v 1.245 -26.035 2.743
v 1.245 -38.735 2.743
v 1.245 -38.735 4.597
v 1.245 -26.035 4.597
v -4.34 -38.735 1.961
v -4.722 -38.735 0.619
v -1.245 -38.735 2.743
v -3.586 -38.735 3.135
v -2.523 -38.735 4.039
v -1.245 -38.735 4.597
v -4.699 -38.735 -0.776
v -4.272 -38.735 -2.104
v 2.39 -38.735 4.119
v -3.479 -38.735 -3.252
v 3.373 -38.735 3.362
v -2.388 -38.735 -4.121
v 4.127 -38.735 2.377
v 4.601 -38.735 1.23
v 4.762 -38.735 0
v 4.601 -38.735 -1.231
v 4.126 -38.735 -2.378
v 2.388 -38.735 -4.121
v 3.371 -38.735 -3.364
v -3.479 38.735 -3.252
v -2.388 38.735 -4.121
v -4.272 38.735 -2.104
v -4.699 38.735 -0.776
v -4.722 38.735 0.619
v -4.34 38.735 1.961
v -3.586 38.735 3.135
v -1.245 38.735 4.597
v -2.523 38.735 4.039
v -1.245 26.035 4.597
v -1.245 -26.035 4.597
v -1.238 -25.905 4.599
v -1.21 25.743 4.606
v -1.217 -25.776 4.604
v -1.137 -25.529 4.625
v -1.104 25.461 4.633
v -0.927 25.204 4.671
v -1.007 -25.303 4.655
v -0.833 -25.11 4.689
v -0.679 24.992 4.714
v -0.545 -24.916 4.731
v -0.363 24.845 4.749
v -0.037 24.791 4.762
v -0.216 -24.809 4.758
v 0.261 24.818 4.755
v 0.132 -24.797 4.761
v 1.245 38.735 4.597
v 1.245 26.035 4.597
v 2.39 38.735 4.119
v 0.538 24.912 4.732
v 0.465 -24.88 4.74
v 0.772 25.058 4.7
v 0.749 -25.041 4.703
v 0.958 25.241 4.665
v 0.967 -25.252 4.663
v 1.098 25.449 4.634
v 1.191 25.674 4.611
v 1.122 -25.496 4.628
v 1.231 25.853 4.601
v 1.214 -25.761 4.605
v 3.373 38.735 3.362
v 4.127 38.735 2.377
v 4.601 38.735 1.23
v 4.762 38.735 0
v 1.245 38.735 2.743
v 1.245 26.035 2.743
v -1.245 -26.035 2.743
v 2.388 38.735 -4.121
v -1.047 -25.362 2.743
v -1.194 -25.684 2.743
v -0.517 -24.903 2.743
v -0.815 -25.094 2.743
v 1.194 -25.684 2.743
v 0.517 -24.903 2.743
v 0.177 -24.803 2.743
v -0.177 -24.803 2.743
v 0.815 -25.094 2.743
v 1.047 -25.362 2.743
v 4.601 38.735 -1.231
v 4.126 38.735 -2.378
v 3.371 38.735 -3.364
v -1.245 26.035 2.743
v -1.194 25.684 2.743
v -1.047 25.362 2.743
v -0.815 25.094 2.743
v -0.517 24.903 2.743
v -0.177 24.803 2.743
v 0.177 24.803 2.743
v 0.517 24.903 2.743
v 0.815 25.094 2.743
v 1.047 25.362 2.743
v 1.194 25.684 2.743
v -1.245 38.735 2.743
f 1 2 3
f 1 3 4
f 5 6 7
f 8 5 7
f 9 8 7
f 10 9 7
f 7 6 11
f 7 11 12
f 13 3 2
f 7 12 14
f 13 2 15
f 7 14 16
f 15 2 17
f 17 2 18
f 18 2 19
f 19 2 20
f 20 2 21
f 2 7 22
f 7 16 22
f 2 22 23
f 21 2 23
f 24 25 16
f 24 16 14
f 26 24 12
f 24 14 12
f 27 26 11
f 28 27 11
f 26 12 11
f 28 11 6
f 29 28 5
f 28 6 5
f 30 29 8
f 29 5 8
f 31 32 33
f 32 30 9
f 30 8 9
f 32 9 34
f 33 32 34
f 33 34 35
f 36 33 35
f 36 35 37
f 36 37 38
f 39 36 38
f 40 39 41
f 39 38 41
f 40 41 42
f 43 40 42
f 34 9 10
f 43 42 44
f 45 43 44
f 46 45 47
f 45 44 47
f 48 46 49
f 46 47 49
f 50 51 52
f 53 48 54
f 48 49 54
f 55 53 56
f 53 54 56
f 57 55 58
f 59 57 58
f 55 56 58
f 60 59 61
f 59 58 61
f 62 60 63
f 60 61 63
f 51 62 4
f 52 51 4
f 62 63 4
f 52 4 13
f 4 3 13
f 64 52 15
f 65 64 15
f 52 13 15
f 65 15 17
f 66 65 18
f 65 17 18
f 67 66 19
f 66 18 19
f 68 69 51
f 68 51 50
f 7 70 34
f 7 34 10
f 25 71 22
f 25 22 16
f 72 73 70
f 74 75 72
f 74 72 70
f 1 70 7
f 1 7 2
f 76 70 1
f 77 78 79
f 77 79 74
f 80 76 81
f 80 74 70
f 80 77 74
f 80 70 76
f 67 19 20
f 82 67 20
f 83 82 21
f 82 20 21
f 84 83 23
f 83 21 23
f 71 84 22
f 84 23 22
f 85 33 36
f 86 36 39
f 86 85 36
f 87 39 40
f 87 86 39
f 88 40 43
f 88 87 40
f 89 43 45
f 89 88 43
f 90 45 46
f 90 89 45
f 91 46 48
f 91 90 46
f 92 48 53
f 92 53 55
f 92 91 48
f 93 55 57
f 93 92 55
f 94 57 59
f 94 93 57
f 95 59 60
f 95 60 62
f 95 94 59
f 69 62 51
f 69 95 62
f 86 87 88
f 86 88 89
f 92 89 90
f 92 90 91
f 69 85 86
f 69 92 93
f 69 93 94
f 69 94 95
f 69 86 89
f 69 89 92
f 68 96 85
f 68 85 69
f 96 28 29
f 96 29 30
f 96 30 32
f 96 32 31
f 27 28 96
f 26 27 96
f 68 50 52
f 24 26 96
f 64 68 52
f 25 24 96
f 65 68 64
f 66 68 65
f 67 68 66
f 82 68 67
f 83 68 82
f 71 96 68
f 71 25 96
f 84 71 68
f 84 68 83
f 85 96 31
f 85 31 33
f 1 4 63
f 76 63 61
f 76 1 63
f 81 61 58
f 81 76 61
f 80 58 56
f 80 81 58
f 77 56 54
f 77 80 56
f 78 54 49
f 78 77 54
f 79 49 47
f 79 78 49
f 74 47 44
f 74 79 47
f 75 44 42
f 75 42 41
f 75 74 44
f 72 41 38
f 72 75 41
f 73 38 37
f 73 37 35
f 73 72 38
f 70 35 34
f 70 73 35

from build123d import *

# Parameters (mm, degrees)
BOSS_EXTRUDE1_DEPTH      = 38.735
BOSS_EXTRUDE1_DEPTH_BACK = 38.735
CUT_EXTRUDE4_DEPTH       = 40.625695711


with BuildPart() as part:
    # Sketch1 → Boss-Extrude1 (new, two sides: drawn at the far end of the back side and taken through both)
    with BuildSketch(Plane(origin=(0, 0, 0), x_dir=(1, 0, 0), z_dir=(0, 1, 0)).offset(-BOSS_EXTRUDE1_DEPTH_BACK)):
        with BuildLine():
            Line((2.3876, 4.120773288), (-2.3876, 4.120773288))
            ThreePointArc((-2.3876, 4.120773288), (-2.378072881, -4.126278665), (4.7625, 0))
            ThreePointArc((4.7625, 0), (4.126278665, 2.378072881), (2.3876, 4.120773288))
        make_face()
    extrude(amount=BOSS_EXTRUDE1_DEPTH + BOSS_EXTRUDE1_DEPTH_BACK)

    # Sketch4 → Cut-Extrude4 (cut, through all)
    with BuildSketch(Plane.XY.offset(2.7432)):
        with BuildLine():
            Line((-1.2446, -26.035), (-1.2446, -38.735))
            Line((-1.2446, -38.735), (1.2446, -38.735))
            Line((1.2446, -38.735), (1.2446, -26.035))
            ThreePointArc((1.2446, -26.035), (0, -27.2796), (-1.2446, -26.035))
        make_face()
        with BuildLine():
            ThreePointArc((1.2446, -26.035), (0, -24.7904), (-1.2446, -26.035))
            Line((-1.2446, -26.035), (1.2446, -26.035))
        make_face()
        with BuildLine():
            Line((1.2446, -26.035), (-1.2446, -26.035))
            ThreePointArc((-1.2446, -26.035), (0, -27.2796), (1.2446, -26.035))
        make_face()
        with BuildLine():
            Line((1.2446, 38.735), (-1.2446, 38.735))
            Line((-1.2446, 38.735), (-1.2446, 26.035))
            ThreePointArc((-1.2446, 26.035), (0, 27.2796), (1.2446, 26.035))
            Line((1.2446, 26.035), (1.2446, 38.735))
        make_face()
        with BuildLine():
            ThreePointArc((1.2446, 26.035), (0, 27.2796), (-1.2446, 26.035))
            Line((-1.2446, 26.035), (1.2446, 26.035))
        make_face()
        with BuildLine():
            Line((1.2446, 26.035), (-1.2446, 26.035))
            ThreePointArc((-1.2446, 26.035), (0, 24.7904), (1.2446, 26.035))
        make_face()
    extrude(amount=CUT_EXTRUDE4_DEPTH, mode=Mode.SUBTRACT)


solid = part.part
